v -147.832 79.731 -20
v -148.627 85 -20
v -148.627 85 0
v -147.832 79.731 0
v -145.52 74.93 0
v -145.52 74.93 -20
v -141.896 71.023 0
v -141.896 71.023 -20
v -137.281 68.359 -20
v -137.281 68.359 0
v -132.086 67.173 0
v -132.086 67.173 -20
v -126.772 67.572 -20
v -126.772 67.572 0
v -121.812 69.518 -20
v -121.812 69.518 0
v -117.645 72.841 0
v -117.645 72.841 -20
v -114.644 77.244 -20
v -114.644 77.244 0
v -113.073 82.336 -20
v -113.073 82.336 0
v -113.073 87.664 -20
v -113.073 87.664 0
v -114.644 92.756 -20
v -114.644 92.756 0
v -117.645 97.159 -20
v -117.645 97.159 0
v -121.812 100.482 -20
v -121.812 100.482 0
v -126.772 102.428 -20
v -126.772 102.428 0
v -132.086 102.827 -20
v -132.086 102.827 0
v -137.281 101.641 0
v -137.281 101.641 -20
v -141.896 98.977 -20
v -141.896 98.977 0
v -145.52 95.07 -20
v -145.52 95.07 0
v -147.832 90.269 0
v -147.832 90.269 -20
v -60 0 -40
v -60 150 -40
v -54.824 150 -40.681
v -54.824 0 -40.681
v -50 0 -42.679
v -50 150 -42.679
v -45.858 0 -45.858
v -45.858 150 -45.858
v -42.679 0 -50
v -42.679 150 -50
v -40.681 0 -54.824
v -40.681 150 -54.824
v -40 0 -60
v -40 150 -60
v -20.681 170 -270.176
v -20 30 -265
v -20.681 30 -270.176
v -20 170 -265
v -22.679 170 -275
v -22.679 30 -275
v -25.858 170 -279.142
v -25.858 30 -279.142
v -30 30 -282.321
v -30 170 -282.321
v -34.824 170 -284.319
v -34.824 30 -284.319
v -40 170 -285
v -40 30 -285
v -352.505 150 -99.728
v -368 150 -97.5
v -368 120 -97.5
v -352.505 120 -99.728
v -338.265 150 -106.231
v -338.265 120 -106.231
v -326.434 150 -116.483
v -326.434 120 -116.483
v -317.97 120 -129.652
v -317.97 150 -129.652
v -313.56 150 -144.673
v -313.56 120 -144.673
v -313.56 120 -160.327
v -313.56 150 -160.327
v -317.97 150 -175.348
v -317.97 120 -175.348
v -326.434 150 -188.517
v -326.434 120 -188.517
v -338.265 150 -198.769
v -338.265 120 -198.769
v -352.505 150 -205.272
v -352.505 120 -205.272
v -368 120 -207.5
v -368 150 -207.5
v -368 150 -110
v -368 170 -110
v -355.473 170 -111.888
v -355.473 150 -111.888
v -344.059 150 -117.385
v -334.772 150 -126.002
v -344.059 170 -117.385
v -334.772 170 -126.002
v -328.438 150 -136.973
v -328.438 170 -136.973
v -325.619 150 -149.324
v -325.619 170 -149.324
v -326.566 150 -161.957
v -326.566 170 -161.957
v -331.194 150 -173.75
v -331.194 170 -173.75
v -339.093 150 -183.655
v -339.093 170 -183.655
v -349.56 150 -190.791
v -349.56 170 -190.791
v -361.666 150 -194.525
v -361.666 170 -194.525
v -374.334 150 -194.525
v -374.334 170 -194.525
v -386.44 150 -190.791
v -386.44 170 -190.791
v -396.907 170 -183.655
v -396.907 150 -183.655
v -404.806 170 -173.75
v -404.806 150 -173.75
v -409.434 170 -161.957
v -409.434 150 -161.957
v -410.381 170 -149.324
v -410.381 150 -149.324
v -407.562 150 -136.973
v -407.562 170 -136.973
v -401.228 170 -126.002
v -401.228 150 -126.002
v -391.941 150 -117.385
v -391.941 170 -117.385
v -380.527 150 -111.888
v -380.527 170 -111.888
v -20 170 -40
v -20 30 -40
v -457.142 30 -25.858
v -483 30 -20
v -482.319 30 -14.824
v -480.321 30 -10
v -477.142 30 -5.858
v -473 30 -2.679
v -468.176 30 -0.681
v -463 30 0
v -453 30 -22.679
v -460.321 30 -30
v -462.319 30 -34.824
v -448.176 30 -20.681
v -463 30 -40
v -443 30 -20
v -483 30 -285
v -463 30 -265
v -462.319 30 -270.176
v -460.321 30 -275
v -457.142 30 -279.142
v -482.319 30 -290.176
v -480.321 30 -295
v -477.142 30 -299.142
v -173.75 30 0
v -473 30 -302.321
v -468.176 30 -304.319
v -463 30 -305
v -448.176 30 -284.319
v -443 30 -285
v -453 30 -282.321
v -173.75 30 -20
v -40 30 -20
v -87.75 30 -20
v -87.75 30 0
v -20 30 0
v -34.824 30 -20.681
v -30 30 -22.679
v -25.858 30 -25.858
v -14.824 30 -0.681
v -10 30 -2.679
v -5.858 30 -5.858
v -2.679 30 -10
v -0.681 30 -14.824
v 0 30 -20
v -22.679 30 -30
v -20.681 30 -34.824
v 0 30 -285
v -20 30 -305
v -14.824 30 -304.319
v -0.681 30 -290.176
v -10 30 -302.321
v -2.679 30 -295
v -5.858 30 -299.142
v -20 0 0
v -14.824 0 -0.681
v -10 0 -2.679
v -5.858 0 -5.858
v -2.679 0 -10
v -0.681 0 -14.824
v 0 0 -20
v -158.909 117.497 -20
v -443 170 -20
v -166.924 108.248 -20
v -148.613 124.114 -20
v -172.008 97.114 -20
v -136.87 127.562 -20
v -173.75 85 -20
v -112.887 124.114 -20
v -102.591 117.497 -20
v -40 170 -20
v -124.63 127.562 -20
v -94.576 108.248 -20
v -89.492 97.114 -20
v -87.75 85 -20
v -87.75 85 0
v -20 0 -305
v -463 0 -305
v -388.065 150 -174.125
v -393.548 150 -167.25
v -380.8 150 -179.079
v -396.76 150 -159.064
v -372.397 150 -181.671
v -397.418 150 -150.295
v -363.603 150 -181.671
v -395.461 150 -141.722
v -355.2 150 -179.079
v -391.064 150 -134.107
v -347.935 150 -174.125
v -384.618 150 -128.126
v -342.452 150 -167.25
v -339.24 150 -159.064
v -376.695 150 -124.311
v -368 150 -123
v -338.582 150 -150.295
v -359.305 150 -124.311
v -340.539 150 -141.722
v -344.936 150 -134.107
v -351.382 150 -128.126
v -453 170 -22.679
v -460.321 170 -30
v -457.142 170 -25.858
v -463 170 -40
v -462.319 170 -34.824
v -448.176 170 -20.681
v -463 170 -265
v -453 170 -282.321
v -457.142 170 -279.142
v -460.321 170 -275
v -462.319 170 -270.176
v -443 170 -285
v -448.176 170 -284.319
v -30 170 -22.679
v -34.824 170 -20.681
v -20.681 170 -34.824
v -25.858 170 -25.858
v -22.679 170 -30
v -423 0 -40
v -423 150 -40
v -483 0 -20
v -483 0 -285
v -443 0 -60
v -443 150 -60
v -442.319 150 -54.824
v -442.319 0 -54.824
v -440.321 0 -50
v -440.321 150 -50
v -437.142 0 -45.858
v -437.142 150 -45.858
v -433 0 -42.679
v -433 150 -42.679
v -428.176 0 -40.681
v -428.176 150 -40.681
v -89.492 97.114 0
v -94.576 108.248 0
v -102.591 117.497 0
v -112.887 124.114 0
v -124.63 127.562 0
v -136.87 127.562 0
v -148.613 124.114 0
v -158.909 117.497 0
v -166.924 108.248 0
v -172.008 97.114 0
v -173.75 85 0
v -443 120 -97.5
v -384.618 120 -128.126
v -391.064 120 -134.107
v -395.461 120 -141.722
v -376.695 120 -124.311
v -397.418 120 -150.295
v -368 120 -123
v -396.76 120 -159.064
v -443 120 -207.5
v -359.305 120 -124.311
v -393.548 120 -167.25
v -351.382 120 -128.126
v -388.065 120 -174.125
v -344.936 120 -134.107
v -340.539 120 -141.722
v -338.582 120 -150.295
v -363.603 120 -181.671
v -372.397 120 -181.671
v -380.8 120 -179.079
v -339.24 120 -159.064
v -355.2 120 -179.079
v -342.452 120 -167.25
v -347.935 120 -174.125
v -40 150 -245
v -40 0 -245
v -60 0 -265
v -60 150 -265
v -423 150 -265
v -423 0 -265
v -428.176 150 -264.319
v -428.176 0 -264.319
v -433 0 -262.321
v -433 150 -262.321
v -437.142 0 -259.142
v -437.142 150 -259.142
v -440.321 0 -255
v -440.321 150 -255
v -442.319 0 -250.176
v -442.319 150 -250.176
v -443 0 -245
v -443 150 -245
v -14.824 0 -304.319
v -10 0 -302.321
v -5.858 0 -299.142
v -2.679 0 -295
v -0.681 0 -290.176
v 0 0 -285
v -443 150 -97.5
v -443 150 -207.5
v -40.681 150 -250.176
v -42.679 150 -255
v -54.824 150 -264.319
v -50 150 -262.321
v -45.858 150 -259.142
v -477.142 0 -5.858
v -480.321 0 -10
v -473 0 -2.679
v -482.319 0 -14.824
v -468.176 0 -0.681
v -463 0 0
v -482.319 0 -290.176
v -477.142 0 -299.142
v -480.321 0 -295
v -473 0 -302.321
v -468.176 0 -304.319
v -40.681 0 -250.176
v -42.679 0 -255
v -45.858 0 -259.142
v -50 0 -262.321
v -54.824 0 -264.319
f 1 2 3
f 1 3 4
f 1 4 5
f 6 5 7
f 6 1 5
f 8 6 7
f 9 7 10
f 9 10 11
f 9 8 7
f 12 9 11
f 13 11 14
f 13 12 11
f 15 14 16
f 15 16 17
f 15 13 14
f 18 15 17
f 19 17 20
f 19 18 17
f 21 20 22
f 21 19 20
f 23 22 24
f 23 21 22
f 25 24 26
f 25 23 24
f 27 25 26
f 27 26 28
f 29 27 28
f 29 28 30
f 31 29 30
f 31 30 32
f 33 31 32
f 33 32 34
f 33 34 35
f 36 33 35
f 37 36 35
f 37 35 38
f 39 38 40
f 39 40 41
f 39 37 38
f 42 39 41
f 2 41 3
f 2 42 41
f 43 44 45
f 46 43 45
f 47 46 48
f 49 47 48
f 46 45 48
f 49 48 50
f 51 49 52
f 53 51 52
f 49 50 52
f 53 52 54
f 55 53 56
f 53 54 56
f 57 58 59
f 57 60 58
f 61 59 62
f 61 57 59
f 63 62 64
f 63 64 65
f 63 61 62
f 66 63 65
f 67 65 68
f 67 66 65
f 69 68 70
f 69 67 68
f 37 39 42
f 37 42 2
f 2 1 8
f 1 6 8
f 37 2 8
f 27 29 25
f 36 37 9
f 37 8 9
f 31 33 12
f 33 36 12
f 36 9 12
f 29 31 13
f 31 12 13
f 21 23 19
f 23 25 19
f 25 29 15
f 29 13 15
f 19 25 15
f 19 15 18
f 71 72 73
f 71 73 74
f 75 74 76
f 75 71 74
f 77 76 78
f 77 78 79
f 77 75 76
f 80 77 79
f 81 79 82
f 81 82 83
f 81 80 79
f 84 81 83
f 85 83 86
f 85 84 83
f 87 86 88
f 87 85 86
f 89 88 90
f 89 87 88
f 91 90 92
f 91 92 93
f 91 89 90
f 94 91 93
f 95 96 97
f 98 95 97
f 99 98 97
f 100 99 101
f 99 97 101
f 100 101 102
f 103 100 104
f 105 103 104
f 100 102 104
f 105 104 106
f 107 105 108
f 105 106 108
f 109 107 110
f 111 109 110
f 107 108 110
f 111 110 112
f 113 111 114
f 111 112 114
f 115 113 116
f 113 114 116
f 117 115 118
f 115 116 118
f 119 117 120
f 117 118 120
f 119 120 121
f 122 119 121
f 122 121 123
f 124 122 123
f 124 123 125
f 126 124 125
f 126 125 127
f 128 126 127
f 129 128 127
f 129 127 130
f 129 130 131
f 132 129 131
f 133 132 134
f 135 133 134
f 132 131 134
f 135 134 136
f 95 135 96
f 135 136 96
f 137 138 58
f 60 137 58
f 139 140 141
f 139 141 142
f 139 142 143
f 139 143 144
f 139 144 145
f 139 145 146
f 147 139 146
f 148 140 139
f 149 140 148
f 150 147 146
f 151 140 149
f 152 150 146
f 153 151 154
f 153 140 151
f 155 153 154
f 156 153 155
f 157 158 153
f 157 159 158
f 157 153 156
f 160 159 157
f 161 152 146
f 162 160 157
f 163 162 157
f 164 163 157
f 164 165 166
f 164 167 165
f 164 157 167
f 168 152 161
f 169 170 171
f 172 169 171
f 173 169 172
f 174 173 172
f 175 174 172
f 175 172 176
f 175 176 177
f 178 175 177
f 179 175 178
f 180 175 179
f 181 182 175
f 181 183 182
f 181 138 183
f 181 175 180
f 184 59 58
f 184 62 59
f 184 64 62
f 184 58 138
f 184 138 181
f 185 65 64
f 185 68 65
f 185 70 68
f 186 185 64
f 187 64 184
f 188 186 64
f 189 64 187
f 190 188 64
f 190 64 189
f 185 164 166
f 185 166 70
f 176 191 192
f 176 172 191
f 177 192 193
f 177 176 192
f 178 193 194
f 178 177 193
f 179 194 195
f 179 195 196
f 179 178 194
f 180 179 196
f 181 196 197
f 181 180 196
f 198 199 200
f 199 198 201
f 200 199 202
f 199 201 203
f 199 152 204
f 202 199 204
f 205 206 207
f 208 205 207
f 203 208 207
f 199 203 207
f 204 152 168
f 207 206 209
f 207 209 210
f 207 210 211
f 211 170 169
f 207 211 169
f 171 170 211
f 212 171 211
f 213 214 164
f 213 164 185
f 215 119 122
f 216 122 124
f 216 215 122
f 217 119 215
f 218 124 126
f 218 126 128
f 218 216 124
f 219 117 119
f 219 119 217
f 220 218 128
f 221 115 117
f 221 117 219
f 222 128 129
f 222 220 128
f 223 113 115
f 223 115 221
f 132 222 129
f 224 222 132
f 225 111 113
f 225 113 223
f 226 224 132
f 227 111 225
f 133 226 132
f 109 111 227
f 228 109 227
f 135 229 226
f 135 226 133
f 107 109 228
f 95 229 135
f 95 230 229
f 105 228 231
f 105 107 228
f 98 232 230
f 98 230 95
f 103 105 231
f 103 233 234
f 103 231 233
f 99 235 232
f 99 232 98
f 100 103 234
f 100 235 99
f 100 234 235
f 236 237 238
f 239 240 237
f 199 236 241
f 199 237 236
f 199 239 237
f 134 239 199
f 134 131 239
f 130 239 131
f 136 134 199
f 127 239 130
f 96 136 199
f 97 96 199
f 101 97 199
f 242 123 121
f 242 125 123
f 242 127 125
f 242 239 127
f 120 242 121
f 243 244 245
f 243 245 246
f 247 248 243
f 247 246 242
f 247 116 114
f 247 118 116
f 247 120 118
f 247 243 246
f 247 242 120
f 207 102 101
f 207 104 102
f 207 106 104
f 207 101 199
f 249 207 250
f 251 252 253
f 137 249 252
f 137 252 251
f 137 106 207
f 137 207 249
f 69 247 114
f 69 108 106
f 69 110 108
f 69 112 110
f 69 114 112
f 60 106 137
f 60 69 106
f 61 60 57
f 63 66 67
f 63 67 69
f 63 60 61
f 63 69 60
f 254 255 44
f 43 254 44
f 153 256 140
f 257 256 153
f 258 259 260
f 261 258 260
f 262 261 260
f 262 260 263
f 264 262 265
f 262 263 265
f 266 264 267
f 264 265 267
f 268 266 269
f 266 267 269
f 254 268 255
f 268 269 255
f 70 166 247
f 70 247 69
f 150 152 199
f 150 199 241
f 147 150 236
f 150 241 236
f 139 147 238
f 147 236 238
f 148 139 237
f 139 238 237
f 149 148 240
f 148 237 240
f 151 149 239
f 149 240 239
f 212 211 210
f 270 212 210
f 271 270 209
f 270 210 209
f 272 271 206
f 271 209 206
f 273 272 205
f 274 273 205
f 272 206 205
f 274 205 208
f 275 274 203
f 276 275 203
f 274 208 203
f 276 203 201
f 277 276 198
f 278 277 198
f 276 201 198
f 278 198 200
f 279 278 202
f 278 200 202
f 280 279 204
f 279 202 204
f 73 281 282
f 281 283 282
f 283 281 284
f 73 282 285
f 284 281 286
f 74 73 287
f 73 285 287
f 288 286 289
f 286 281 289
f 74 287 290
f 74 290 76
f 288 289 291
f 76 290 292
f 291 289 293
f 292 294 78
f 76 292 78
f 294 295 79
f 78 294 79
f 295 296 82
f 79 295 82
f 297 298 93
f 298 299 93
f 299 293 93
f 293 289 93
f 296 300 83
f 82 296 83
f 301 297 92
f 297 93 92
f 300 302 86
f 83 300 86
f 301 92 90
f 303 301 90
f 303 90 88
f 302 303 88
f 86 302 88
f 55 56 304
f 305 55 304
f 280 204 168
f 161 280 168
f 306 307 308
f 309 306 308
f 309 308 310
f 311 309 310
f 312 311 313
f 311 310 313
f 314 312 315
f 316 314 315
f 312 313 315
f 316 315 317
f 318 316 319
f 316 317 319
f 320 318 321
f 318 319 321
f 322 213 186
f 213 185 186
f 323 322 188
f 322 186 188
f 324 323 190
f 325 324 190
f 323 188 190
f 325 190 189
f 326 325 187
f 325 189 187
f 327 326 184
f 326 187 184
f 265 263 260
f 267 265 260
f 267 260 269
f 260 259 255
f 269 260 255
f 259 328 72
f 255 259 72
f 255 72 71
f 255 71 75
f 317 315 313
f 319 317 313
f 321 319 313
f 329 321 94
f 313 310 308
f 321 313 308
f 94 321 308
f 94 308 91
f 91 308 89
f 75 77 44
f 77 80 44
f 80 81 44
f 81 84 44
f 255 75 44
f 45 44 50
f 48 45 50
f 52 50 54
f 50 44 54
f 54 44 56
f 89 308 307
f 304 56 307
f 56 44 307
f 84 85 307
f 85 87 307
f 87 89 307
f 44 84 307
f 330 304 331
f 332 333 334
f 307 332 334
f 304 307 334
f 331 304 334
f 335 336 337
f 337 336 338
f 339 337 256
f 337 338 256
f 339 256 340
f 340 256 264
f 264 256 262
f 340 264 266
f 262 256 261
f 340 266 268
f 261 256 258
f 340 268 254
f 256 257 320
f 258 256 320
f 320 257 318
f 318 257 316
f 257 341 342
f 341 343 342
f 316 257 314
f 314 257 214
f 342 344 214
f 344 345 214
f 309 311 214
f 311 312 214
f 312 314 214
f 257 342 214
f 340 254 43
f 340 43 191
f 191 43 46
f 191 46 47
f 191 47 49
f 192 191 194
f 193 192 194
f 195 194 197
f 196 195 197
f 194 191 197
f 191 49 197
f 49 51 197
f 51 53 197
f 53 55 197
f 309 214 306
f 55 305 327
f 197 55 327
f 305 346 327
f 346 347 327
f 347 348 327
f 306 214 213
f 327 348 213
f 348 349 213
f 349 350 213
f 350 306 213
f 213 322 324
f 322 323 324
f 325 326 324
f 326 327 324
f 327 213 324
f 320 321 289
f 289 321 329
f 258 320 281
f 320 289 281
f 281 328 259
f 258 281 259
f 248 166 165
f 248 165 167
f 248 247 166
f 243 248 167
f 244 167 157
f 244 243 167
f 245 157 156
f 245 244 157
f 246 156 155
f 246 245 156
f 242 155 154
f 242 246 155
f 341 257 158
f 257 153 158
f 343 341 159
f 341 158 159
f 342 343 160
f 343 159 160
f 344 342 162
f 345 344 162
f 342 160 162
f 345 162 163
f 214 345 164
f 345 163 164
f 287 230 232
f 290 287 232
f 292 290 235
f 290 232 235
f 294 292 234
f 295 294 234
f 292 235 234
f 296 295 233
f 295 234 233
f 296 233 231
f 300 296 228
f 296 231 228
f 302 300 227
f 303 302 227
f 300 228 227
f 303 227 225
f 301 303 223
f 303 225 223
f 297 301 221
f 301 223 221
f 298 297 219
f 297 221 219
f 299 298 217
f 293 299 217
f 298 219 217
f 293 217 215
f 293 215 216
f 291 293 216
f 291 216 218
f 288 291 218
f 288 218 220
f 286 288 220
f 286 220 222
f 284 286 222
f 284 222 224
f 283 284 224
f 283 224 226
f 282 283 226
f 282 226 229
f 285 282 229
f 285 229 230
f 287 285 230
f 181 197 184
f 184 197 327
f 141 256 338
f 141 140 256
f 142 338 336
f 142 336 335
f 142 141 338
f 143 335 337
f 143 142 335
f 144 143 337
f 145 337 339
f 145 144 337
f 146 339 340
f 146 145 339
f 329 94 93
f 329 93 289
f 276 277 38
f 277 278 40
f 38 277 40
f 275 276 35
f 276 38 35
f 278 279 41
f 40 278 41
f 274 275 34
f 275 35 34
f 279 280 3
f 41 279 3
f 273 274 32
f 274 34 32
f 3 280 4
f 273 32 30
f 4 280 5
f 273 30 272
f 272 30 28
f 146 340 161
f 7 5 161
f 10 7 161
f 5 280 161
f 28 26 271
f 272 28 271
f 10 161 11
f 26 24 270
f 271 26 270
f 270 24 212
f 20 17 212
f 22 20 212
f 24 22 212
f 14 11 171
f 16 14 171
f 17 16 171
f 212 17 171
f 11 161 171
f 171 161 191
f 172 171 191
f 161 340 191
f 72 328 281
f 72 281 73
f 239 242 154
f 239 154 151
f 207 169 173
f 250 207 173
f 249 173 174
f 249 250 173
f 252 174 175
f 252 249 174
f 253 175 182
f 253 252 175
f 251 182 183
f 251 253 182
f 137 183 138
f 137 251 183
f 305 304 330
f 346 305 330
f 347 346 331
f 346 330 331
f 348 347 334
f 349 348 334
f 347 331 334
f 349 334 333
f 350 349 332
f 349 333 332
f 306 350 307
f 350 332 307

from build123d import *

# Parameters (mm, degrees)
SKETCH_1_W          = 483
SKETCH_1_H          = 305
EXTRUDE_1_DEPTH     = 30
SKETCH_2_W          = 443
SKETCH_2_H          = 265
EXTRUDE_2_DEPTH     = 140
FILLET_2_R          = 20
CUT_EXTRUDE_START   = -20
CUT_EXTRUDE_3_DEPTH = 576.998322145
SKETCH_7_R          = 42.5
SKETCH_7_R_2        = 29.5
EXTRUDE_3_DEPTH     = 50
SKETCH_7_5_R        = 42.5
SKETCH_7_5_R_2      = 29.5
CUT_EXTRUDE_5_DEPTH = 20
SKETCH_7_6_R        = 29.5
CUT_EXTRUDE_6_DEPTH = 40
SKETCH_9_R          = 17.8766886
EXTRUDE_4_DEPTH     = 20


with BuildPart() as part:
    # 草图1 → 凸台-拉伸1 (new body)
    with BuildSketch(Plane(origin=(0, 0, 0), x_dir=(1, 0, 0), z_dir=(0, 1, 0))):
        with Locations((-241.5, 152.5)):
            Rectangle(SKETCH_1_W, SKETCH_1_H)
    extrude(amount=EXTRUDE_1_DEPTH)

    # 草图2 → 凸台-拉伸2 (add)
    with BuildSketch(Plane(origin=(0, 30, 0), x_dir=(1, 0, 0), z_dir=(0, 1, 0))):
        with Locations((-241.5, 152.5)):
            Rectangle(SKETCH_2_W, SKETCH_2_H)
    extrude(amount=EXTRUDE_2_DEPTH)

    # 圆角2
    fillet_2_edges = [part.edges().sort_by_distance(p)[0] for p in [
        (-463, 100, -285),
        (-463, 100, -20),
        (-20, 100, -20),
        (-20, 100, -285),
        (0, 15, 0),
        (-483, 15, 0),
        (-483, 15, -305),
        (0, 15, -305),
    ]]
    fillet(fillet_2_edges, radius=FILLET_2_R)

    # 草图5 → 切除-拉伸3 (cut, through all)
    with BuildSketch(Plane(origin=(0, 170, 0), x_dir=(1, 0, 0), z_dir=(0, 1, 0)).offset(CUT_EXTRUDE_START)):
        with BuildLine():
            Line((-40, 60), (-40, 245))
            ThreePointArc((-40, 245), (-45.857864376, 259.142135624), (-60, 265))
            Line((-60, 265), (-423, 265))
            ThreePointArc((-423, 265), (-437.142135624, 259.142135624), (-443, 245))
            Line((-443, 245), (-443, 60))
            ThreePointArc((-443, 60), (-437.142135624, 45.857864376), (-423, 40))
            Line((-423, 40), (-60, 40))
            ThreePointArc((-60, 40), (-45.857864376, 45.857864376), (-40, 60))
        make_face()
    extrude(amount=-CUT_EXTRUDE_3_DEPTH, mode=Mode.SUBTRACT)

    # 草图7 → 凸台-拉伸3 (add)
    # profile 1 of 2: a face of its own
    with BuildSketch(Plane(origin=(0, 170, 0), x_dir=(1, 0, 0), z_dir=(0, 1, 0))):
        with BuildLine():
            Line((-368, 207.5), (-463, 207.5))
            Line((-463, 207.5), (-463, 97.5))
            Line((-463, 97.5), (-368, 97.5))
            ThreePointArc((-368, 97.5), (-313, 152.5), (-368, 207.5))
        make_face()
        with Locations((-368, 152.5)):
            Circle(SKETCH_7_R, mode=Mode.SUBTRACT)
    # profile 2 of 2: a face of its own
    with BuildSketch(Plane(origin=(0, 170, 0), x_dir=(1, 0, 0), z_dir=(0, 1, 0))):
        with Locations((-368, 152.5)):
            Circle(SKETCH_7_R)
        with Locations(Location((-368, 152.5, 0), (0, 0, 270))):
            Circle(SKETCH_7_R_2, mode=Mode.SUBTRACT)
    extrude(amount=-EXTRUDE_3_DEPTH)

    # 草图7<5> → 切除-拉伸5 (cut)
    with BuildSketch(Plane(origin=(0, 170, 0), x_dir=(1, 0, 0), z_dir=(0, 1, 0))):
        with Locations(Location((-368, 152.5, 0), (0, 0, 270))):
            Circle(SKETCH_7_5_R)
        with Locations(Location((-368, 152.5, 0), (0, 0, 270))):
            Circle(SKETCH_7_5_R_2, mode=Mode.SUBTRACT)
    extrude(amount=-CUT_EXTRUDE_5_DEPTH, mode=Mode.SUBTRACT)


with BuildPart() as cut_extrude_5_piece_1:
    # of the separate pieces the step leaves, piece 1, a body of its own (cut_extrude_5_pieces)
    add(part.part.solids().sort_by_distance((-20, 0, 0))[0])

    # 草图9 → 凸台-拉伸4 (add)
    with BuildSketch(Plane.XY.offset(-20)):
        with BuildLine():
            Line((-87.75, 30), (-87.75, 85))
            ThreePointArc((-87.75, 85), (-130.75, 128), (-173.75, 85))
            Line((-173.75, 85), (-173.75, 30))
            Line((-173.75, 30), (-87.75, 30))
        make_face()
        with Locations(Location((-130.75, 85, 0), (0, 0, 180))):
            Circle(SKETCH_9_R, mode=Mode.SUBTRACT)
    extrude(amount=EXTRUDE_4_DEPTH)


with BuildPart() as cut_extrude_5_piece_2:
    # of the separate pieces the step leaves, piece 2, a body of its own (cut_extrude_5_pieces)
    add(part.part.solids().sort_by_distance((-368, 170, -123))[0])

    # 草图7<6> → 切除-拉伸6 (cut)
    with BuildSketch(Plane(origin=(0, 170, 0), x_dir=(1, 0, 0), z_dir=(0, 1, 0))):
        with Locations(Location((-368, 152.5, 0), (0, 0, 270))):
            Circle(SKETCH_7_6_R)
    extrude(amount=-CUT_EXTRUDE_6_DEPTH, mode=Mode.SUBTRACT)


solid = cut_extrude_5_piece_1.part
